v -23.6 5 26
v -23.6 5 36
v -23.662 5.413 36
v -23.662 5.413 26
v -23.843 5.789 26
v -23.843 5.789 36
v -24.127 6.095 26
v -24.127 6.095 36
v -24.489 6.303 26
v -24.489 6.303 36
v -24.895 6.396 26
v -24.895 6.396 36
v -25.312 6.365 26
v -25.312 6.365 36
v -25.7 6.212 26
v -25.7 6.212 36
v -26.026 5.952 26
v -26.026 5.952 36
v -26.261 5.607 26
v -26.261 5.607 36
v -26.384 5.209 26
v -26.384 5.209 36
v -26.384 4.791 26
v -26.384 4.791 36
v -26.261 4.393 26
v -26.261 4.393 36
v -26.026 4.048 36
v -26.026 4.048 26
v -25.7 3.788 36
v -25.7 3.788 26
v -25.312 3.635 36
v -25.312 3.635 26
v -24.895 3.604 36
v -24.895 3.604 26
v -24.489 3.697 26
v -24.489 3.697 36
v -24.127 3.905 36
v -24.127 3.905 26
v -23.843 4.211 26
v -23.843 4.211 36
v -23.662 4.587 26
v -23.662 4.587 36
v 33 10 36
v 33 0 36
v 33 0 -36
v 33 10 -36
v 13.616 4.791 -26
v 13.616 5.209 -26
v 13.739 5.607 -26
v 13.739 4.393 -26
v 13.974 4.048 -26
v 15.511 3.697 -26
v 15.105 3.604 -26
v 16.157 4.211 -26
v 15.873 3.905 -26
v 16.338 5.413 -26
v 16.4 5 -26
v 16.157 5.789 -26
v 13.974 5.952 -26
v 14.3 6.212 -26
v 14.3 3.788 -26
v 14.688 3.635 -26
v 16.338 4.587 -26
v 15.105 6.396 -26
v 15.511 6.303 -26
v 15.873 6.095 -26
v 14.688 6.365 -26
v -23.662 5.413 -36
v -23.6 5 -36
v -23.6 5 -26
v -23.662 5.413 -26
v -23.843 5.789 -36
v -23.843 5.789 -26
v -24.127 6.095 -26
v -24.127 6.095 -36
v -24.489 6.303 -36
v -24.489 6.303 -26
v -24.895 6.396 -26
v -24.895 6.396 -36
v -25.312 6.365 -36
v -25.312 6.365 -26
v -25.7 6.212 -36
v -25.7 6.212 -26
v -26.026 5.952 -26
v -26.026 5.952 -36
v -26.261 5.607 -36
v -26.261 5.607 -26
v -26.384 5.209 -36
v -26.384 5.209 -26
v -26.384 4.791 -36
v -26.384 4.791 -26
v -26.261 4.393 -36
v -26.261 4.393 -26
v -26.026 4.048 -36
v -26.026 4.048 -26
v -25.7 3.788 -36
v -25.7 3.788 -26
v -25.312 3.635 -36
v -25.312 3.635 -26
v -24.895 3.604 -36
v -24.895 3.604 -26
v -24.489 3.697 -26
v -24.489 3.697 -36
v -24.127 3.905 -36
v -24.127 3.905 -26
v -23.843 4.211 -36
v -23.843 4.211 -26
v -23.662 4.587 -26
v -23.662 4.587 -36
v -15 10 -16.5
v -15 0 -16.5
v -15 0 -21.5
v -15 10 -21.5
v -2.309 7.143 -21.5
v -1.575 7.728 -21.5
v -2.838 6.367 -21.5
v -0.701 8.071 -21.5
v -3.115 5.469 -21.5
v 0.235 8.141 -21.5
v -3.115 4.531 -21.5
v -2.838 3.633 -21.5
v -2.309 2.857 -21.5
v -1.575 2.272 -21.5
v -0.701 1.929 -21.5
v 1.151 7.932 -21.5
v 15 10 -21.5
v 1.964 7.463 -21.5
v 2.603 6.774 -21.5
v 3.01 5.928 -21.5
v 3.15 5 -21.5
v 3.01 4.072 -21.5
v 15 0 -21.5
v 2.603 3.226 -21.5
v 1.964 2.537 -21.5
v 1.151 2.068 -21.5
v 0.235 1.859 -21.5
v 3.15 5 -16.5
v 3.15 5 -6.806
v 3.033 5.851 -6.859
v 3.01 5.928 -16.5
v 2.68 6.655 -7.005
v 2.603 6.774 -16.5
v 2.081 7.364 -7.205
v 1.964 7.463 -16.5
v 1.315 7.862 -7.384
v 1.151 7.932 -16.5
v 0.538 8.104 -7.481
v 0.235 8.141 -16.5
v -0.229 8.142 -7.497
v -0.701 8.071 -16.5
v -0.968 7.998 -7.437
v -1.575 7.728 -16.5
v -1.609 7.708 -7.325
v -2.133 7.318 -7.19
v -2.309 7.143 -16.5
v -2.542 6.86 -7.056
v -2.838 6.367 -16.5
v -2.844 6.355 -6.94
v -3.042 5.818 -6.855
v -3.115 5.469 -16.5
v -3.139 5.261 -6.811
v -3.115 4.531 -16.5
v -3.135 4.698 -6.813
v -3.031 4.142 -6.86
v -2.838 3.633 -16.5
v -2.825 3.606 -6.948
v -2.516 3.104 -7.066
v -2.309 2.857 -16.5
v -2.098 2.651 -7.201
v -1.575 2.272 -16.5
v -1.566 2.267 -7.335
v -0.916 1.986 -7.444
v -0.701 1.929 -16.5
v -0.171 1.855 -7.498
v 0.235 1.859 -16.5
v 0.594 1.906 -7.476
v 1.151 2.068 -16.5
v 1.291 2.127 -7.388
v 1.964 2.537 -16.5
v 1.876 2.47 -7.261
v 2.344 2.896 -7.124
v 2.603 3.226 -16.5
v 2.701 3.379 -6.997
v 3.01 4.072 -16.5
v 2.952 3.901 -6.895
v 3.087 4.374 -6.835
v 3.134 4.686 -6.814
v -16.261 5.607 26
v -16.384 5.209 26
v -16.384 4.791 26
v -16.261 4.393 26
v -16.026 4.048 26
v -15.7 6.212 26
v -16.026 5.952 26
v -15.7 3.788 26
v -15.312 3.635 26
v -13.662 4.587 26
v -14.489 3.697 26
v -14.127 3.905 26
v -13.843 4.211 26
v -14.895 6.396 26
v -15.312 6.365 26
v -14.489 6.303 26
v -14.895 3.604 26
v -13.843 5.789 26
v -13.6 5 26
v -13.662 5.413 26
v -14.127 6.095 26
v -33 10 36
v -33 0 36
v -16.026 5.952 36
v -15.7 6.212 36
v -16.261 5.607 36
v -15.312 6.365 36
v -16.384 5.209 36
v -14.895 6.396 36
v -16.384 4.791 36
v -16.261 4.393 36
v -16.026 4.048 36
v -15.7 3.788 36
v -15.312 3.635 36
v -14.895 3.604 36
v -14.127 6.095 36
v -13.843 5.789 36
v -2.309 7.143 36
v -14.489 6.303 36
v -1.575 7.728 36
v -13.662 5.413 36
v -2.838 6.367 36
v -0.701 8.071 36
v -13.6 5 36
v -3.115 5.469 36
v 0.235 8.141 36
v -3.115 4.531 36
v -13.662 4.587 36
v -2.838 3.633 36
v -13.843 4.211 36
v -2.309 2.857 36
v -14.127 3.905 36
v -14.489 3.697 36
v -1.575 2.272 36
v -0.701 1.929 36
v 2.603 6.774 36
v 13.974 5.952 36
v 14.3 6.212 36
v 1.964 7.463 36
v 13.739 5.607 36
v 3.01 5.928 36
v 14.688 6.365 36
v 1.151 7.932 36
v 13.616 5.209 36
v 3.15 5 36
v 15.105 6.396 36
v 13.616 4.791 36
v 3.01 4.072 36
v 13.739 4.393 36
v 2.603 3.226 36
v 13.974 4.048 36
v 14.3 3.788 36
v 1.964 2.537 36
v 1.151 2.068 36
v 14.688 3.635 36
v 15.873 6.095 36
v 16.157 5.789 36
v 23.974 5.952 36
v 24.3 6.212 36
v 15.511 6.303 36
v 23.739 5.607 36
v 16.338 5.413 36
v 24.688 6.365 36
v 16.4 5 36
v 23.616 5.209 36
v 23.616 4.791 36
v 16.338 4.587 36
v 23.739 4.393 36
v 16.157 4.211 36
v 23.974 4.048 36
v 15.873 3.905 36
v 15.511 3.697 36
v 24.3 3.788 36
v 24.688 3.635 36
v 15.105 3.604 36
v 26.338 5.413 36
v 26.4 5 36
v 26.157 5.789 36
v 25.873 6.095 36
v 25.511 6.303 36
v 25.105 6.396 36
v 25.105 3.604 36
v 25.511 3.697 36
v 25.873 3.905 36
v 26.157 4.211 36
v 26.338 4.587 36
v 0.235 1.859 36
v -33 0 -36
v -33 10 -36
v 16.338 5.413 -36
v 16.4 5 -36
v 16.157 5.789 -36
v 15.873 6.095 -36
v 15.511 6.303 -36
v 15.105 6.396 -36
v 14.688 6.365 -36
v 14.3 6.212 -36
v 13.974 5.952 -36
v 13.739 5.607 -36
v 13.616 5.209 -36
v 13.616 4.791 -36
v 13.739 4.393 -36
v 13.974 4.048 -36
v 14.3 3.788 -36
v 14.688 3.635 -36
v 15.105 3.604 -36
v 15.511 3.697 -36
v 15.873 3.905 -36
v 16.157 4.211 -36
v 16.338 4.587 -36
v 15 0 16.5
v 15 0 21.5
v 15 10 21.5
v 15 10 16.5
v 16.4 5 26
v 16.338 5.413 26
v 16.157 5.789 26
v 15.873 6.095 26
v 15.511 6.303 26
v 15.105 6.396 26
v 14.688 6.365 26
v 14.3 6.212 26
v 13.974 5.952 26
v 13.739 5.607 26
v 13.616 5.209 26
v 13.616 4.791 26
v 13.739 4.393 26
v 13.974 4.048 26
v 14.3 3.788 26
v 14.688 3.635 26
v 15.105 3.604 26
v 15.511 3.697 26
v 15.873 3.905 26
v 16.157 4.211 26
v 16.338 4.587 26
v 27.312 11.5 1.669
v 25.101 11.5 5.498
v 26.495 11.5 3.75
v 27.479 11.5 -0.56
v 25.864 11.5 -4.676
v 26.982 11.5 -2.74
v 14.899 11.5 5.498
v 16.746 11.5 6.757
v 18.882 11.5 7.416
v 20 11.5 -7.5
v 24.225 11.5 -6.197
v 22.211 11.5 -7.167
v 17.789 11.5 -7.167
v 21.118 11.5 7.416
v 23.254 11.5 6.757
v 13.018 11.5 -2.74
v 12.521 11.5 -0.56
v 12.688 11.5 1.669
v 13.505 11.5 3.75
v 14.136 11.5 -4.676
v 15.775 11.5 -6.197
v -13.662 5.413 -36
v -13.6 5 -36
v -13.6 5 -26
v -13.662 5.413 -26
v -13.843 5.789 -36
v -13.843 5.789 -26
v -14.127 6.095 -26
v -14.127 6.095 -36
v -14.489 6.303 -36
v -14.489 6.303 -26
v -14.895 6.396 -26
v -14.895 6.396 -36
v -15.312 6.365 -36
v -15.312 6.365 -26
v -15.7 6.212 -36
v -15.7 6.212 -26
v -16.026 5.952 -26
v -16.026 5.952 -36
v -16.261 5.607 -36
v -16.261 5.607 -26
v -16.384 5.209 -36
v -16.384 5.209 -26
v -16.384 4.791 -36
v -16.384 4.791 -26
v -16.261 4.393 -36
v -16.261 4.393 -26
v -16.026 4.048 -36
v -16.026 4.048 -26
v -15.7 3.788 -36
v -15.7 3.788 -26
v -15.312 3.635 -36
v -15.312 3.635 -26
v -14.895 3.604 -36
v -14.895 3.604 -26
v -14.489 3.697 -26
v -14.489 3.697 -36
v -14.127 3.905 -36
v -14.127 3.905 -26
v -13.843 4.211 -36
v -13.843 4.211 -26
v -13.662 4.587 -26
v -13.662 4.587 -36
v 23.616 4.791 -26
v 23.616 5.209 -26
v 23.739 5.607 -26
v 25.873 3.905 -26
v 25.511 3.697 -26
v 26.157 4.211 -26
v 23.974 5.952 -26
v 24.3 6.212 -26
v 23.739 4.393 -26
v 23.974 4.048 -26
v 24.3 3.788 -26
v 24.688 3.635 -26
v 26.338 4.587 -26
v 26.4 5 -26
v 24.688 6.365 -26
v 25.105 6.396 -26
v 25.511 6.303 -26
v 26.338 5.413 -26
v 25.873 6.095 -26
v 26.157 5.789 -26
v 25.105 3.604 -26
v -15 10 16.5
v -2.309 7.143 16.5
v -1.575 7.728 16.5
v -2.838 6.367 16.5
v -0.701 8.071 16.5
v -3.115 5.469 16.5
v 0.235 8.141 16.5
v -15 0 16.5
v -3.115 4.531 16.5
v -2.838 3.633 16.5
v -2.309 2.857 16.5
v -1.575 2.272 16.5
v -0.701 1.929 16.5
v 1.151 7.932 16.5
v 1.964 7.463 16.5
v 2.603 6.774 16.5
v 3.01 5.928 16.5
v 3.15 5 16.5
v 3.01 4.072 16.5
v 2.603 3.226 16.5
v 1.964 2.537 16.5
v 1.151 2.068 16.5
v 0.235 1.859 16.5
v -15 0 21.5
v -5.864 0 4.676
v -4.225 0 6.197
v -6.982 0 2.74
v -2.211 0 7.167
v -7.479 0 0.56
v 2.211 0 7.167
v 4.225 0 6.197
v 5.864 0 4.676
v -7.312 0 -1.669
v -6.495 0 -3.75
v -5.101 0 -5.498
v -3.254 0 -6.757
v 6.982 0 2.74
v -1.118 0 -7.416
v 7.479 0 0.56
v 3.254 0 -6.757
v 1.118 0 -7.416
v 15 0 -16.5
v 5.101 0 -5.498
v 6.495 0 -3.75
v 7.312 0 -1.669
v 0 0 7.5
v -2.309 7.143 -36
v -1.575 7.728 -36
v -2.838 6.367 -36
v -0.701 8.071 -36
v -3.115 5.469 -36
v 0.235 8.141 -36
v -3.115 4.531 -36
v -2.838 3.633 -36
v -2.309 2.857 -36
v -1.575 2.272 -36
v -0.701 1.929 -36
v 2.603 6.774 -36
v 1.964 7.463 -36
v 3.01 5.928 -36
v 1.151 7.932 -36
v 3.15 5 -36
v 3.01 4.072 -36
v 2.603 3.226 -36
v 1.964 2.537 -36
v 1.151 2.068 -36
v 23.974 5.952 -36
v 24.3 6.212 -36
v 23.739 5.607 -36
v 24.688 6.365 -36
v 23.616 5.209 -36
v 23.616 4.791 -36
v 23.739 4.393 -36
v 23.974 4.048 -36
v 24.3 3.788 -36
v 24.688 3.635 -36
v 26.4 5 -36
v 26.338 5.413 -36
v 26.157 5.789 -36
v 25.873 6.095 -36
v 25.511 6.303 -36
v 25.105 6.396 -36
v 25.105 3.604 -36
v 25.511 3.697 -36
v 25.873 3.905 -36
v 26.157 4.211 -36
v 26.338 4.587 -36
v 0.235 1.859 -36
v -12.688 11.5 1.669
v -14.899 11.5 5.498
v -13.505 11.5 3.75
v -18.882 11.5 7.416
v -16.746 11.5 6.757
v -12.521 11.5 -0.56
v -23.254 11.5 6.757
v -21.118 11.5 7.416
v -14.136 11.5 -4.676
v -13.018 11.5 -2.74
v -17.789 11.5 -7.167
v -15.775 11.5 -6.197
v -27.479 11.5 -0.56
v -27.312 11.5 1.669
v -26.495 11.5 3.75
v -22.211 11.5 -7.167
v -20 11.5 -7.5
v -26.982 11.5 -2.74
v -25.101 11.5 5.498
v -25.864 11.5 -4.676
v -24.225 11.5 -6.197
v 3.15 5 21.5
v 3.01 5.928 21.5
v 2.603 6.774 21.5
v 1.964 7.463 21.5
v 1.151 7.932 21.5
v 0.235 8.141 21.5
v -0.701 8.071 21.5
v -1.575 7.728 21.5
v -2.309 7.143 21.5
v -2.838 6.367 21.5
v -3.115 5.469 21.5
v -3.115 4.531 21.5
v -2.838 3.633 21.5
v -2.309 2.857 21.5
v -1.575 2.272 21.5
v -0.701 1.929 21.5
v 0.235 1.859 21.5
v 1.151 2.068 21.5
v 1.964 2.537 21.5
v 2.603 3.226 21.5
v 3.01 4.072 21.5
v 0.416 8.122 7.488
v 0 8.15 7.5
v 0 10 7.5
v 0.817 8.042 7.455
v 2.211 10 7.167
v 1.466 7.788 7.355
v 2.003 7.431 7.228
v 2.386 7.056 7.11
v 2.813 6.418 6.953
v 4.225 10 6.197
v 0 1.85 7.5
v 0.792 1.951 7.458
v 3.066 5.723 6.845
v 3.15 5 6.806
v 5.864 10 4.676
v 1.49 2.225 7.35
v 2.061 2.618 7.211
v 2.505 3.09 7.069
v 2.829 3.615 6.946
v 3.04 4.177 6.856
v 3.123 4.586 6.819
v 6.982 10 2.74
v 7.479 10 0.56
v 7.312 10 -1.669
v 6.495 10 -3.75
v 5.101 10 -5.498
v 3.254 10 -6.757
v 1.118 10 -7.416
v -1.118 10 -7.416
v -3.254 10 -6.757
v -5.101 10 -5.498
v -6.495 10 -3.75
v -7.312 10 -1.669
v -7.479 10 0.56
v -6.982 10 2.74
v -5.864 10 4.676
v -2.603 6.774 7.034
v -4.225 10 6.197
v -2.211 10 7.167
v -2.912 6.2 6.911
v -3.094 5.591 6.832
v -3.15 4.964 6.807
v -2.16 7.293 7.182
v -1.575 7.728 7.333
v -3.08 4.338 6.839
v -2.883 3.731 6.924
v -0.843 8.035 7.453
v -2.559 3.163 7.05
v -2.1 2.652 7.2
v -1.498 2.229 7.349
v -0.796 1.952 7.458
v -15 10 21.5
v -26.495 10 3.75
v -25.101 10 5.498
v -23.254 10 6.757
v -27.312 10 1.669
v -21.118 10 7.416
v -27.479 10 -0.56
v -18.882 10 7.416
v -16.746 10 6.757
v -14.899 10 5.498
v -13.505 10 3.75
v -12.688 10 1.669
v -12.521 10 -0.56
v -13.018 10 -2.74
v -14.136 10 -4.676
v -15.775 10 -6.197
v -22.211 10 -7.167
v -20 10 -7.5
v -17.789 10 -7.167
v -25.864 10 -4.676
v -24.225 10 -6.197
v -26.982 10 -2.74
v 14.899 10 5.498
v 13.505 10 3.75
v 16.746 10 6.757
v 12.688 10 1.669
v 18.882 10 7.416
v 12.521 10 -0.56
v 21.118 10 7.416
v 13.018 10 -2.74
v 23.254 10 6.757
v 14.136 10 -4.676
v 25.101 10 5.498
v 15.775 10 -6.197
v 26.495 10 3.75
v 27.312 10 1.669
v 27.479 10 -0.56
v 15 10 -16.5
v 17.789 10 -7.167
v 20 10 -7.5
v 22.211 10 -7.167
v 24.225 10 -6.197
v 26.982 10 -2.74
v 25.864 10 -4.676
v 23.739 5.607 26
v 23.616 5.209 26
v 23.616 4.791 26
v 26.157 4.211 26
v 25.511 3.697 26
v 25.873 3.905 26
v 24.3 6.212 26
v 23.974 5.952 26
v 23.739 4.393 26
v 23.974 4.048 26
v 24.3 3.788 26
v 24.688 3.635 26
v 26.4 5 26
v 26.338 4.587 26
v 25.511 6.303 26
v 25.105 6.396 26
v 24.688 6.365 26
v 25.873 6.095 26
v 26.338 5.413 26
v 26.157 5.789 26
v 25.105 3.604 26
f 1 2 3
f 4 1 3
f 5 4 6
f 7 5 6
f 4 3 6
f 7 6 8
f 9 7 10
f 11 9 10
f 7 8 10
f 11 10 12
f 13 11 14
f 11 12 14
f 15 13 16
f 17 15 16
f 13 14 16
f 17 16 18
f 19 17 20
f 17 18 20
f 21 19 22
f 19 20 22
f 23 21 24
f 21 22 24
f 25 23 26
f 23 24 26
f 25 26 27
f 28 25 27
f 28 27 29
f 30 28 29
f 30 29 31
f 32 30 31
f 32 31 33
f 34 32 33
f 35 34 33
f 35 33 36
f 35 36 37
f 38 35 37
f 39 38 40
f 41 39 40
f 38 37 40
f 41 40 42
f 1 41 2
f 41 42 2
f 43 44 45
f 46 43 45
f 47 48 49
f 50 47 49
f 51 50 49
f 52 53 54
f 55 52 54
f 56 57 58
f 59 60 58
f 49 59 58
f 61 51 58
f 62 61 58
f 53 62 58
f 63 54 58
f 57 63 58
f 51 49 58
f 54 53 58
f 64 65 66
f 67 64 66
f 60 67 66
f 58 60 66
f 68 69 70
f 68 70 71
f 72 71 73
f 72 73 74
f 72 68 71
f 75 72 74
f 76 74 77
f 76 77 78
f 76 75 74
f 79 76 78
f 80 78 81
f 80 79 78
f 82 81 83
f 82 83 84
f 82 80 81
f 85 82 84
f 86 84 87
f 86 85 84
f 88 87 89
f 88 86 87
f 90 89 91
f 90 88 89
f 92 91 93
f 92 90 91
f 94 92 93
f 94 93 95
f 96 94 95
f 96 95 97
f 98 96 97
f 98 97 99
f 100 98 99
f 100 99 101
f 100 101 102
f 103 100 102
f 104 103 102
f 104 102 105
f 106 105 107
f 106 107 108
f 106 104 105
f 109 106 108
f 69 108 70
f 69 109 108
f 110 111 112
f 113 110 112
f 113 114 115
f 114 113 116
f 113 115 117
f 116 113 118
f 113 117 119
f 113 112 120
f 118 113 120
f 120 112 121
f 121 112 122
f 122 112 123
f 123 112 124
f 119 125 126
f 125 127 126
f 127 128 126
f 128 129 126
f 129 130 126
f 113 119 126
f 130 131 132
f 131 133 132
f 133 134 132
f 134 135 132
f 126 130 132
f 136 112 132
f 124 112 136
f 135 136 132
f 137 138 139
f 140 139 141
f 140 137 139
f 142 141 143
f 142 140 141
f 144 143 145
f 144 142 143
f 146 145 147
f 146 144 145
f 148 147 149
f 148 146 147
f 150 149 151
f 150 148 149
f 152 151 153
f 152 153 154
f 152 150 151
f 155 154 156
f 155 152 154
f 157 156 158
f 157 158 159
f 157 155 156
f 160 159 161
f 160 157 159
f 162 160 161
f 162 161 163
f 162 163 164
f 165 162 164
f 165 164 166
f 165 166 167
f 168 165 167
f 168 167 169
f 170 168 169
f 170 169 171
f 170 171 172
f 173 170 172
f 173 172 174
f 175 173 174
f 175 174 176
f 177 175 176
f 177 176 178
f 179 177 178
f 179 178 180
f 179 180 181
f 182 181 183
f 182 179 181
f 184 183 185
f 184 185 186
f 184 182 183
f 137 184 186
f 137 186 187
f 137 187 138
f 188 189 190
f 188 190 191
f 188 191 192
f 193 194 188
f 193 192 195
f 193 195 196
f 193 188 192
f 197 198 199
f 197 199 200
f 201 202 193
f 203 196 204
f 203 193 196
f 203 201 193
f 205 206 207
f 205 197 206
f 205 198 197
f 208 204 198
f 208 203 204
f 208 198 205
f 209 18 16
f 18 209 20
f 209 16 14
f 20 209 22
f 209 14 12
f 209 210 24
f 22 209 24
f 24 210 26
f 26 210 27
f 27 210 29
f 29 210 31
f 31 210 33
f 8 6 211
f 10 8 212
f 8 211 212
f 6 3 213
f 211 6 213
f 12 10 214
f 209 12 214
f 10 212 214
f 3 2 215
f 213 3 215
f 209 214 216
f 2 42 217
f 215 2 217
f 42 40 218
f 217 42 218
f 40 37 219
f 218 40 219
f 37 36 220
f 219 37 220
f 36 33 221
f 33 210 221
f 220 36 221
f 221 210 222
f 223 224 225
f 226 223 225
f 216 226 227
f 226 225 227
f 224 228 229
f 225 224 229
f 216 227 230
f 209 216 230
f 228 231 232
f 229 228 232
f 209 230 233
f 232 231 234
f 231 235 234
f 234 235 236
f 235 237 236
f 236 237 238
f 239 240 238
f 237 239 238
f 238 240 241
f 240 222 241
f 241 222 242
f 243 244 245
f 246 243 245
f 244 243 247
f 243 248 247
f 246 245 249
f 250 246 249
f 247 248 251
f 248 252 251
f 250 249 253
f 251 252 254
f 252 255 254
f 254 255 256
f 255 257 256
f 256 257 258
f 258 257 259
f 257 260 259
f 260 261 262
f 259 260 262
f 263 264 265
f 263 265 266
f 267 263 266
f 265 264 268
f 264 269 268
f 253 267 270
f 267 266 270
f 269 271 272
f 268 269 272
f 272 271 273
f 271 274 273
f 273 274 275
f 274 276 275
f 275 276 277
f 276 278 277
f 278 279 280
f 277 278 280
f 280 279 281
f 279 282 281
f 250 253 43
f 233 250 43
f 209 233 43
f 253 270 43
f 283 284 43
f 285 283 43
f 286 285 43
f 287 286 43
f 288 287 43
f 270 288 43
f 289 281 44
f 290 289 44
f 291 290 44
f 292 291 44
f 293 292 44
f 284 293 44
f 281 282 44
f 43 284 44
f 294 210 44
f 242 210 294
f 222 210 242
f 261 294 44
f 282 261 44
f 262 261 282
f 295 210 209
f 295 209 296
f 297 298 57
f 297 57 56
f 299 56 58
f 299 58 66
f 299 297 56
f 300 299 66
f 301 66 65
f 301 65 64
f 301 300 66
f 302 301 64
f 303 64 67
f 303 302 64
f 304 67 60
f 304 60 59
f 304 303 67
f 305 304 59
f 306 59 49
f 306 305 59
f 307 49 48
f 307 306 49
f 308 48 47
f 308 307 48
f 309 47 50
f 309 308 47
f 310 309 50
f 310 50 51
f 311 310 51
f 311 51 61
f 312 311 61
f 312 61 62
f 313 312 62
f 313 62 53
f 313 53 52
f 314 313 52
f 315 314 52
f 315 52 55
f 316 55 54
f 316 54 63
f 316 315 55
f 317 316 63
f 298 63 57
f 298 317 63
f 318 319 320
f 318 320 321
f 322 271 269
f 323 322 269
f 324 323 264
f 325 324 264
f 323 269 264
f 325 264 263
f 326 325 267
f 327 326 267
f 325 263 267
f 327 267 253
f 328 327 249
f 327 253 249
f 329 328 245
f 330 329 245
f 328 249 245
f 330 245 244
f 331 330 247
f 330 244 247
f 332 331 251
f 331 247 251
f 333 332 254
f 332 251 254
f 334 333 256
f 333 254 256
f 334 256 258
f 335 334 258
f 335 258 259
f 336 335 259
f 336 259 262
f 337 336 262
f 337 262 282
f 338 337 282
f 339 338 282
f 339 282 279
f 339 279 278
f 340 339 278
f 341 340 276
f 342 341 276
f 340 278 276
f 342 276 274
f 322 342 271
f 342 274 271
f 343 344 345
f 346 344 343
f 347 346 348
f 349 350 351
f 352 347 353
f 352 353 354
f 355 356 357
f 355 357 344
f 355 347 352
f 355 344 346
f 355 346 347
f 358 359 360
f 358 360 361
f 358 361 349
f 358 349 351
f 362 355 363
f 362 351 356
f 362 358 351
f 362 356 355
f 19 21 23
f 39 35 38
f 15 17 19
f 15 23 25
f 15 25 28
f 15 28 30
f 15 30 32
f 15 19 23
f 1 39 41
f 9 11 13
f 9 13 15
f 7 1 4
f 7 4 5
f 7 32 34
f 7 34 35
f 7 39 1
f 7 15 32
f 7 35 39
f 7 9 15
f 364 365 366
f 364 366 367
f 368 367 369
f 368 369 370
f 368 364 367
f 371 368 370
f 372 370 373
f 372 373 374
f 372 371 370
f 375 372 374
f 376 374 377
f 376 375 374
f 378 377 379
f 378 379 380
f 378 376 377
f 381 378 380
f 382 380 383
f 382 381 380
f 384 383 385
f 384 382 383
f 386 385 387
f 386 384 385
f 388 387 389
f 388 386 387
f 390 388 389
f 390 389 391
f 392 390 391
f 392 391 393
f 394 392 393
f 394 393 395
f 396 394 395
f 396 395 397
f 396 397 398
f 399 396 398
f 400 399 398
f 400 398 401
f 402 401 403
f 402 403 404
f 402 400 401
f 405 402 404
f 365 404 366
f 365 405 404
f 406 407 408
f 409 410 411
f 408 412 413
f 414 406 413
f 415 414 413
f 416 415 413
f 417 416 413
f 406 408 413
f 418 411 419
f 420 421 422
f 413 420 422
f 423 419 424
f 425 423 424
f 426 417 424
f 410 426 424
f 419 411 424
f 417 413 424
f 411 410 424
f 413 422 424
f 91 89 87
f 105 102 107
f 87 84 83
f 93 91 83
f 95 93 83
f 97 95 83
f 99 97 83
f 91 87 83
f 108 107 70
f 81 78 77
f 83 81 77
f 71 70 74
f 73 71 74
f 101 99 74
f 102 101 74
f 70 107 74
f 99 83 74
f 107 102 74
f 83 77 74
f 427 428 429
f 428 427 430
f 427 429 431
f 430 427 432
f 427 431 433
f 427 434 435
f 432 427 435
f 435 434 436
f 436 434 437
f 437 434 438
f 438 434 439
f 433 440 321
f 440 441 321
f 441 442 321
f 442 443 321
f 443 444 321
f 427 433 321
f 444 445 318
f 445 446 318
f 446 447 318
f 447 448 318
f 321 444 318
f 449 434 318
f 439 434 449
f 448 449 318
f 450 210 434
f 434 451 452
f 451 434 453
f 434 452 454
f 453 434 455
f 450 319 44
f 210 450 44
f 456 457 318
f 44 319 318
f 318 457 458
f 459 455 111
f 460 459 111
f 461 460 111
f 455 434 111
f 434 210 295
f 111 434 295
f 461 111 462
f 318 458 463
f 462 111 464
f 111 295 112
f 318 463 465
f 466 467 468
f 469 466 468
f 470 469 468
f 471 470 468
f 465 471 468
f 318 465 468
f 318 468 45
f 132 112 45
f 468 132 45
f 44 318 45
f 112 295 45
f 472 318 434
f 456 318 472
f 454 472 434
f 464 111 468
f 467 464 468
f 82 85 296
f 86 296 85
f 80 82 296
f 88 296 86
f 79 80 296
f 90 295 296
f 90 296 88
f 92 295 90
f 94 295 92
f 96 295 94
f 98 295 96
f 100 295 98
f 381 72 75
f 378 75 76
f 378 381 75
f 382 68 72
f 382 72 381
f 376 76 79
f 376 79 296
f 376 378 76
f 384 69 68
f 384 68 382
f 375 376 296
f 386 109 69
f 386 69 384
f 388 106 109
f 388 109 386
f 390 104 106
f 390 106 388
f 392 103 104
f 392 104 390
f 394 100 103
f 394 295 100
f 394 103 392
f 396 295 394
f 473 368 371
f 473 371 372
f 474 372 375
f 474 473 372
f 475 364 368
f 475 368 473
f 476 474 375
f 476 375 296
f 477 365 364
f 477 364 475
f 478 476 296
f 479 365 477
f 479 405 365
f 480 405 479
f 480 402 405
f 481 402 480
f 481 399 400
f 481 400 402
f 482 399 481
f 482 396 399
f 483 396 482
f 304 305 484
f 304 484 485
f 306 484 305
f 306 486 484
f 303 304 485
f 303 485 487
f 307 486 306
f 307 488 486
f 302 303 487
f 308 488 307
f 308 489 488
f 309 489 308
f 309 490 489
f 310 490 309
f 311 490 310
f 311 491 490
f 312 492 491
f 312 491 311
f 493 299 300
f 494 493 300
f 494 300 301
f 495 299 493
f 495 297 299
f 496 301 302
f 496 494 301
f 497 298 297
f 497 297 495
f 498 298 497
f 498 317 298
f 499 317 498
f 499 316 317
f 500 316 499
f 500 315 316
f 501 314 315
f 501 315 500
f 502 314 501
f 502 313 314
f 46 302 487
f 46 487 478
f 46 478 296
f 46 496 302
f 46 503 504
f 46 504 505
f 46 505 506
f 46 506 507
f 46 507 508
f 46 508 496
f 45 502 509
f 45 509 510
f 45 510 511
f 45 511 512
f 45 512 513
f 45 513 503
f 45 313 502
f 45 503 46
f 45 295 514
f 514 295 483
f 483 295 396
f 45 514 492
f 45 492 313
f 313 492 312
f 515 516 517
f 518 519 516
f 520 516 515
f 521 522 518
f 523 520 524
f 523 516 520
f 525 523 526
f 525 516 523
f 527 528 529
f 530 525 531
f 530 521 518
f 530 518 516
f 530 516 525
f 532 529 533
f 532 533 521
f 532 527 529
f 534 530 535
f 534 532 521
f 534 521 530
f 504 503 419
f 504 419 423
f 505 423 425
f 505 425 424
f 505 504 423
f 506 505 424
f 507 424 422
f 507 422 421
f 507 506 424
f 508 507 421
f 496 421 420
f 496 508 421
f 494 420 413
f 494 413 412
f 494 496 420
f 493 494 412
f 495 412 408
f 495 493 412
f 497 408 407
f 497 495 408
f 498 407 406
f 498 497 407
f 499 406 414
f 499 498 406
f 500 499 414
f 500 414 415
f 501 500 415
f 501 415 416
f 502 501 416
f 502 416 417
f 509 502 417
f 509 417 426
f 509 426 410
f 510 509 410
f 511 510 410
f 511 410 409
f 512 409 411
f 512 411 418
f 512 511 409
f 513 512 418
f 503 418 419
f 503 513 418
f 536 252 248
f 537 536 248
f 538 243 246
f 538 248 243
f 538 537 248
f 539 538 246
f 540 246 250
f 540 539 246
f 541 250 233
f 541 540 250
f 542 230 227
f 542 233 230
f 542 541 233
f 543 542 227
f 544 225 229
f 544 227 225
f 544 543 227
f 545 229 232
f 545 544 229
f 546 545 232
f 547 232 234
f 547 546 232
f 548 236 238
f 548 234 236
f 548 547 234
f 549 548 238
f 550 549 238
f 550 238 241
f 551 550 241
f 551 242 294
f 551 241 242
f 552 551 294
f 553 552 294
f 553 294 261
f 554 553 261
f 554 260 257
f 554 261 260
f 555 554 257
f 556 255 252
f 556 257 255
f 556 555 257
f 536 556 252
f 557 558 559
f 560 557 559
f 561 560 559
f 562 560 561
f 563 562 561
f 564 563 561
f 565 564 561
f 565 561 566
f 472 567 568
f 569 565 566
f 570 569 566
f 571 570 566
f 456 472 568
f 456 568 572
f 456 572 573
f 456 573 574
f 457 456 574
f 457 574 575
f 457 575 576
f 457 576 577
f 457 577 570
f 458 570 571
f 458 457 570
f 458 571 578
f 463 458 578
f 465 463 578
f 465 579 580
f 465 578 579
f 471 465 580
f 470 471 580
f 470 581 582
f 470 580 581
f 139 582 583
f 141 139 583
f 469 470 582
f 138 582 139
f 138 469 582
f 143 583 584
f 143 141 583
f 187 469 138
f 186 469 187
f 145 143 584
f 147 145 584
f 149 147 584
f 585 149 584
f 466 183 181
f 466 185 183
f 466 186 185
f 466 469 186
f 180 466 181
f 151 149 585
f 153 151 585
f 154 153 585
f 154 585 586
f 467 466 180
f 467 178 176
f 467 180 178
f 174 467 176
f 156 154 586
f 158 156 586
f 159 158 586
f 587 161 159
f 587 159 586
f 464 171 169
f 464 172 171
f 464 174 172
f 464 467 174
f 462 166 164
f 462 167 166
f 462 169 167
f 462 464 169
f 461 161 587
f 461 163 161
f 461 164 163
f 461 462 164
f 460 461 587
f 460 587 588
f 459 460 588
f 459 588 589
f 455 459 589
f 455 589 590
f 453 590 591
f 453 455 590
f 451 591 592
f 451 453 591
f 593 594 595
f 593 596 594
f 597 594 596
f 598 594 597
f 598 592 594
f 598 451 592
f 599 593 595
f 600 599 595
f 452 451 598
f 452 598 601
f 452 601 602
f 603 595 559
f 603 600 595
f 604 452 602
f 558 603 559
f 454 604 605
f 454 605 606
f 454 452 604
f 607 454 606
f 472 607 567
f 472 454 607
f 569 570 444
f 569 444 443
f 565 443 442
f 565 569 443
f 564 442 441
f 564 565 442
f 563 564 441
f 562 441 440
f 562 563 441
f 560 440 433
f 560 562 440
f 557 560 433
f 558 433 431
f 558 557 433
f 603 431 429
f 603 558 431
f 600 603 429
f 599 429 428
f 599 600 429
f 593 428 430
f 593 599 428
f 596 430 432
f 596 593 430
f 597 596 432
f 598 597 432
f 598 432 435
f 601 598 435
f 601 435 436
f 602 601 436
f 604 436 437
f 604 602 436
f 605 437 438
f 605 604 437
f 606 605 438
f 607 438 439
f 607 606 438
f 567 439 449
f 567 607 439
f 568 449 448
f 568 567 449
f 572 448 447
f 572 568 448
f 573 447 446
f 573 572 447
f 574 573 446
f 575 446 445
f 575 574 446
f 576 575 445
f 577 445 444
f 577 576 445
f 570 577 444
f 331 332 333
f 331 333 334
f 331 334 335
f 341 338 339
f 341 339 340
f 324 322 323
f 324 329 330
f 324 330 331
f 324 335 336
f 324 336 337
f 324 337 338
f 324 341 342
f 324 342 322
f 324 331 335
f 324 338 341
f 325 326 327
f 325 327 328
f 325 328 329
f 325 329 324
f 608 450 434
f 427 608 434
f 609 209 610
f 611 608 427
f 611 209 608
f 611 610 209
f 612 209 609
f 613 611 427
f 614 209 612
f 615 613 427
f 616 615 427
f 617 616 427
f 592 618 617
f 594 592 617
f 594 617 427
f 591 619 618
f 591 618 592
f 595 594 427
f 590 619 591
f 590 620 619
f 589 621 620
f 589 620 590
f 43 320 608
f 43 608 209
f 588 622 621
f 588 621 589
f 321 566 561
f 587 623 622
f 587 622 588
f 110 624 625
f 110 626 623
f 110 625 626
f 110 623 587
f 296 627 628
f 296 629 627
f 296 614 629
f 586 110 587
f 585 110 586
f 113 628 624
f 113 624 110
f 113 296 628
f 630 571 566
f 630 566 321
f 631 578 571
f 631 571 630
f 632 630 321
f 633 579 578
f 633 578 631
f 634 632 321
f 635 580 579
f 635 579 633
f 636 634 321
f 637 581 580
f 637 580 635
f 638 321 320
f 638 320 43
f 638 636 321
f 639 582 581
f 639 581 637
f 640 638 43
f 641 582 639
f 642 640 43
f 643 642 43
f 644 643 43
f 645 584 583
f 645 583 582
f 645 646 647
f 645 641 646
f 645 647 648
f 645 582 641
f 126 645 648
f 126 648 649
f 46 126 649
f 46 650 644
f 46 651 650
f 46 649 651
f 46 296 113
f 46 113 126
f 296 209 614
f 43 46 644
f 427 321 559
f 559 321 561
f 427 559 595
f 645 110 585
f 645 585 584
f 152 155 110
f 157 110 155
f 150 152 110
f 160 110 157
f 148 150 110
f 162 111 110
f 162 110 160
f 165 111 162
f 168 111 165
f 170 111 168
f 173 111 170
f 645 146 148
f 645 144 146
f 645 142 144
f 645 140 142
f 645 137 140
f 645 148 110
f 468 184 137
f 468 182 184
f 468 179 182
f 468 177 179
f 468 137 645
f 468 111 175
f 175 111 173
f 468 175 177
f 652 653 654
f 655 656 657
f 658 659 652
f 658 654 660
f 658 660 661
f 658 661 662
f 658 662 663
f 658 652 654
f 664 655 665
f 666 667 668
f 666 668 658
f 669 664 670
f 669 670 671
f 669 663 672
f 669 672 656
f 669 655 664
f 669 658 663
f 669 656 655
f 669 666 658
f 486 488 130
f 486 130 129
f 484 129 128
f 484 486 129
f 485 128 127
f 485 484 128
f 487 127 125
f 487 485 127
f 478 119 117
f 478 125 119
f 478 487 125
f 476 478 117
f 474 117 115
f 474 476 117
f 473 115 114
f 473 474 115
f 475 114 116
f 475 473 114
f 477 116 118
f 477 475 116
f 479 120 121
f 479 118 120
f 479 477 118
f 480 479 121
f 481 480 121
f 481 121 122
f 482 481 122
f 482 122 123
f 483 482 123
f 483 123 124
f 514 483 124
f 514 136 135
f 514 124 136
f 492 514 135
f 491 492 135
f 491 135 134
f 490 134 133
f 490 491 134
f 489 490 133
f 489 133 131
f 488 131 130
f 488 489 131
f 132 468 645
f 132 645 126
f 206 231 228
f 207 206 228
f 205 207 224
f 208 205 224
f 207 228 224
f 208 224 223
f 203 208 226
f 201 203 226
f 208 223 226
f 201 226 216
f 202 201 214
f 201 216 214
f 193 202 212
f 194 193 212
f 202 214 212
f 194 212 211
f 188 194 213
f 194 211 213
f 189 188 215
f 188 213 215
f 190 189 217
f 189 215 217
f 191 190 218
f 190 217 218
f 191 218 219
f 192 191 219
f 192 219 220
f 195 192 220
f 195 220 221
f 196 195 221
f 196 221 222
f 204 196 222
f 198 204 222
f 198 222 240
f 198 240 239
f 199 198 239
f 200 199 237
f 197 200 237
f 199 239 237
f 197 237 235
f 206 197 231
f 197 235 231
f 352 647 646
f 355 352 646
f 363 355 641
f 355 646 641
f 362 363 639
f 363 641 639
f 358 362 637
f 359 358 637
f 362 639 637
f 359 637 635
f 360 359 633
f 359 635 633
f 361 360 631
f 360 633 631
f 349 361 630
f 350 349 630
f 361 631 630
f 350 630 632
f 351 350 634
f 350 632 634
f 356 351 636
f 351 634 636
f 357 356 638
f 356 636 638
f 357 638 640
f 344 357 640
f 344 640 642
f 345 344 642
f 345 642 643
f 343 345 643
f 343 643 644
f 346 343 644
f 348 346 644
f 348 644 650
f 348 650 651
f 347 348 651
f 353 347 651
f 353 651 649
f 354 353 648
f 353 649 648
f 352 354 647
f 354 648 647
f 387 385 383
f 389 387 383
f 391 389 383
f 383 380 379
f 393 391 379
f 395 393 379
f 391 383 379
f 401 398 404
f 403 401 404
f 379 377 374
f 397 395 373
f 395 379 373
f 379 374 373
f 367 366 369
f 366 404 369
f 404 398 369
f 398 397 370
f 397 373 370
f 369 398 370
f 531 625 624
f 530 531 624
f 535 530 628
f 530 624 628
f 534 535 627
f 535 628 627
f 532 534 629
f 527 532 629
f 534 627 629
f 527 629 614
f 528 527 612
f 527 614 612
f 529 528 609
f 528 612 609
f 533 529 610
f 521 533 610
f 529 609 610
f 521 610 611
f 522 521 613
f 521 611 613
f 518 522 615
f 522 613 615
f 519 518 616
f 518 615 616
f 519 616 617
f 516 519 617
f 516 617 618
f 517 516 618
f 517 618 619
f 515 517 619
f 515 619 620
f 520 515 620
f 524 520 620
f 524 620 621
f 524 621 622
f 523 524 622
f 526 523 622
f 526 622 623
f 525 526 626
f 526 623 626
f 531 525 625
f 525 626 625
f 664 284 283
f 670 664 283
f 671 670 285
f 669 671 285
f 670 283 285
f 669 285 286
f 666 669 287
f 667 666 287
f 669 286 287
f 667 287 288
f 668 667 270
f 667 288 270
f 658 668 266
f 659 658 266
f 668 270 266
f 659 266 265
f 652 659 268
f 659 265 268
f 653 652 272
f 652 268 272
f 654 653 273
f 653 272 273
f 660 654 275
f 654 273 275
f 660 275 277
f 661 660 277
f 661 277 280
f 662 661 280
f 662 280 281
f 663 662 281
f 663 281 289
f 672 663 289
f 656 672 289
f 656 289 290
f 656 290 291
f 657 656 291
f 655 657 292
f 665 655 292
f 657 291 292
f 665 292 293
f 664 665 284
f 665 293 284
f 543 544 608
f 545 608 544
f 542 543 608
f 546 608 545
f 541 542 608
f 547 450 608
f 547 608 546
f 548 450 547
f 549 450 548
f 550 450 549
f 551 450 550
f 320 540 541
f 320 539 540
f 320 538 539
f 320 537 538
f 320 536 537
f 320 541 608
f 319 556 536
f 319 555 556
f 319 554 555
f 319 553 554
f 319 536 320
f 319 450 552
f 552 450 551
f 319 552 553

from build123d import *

# Parameters (mm, degrees)
SKETCH1_W               = 66
SKETCH1_H               = 72
BOSS_EXTRUDE1_DEPTH     = 10
SKETCH2_R               = 1.4
CUT_EXTRUDE1_DEPTH      = 10
CUT_EXTRUDE2_DEPTH      = 50.849774322
CUT_EXTRUDE2_DEPTH_BACK = 50.849774322
SKETCH3_W               = 30
SKETCH3_H               = 5
CUT_EXTRUDE3_DEPTH      = 80.831071645
CUT_EXTRUDE3_DEPTH_BACK = 80.831071645
SKETCH4_R               = 3.15
SKETCH5_R               = 7.5
BOSS_EXTRUDE2_DEPTH     = 1.5
CUT_EXTRUDE4_DEPTH      = 50.849774322
CUT_EXTRUDE4_DEPTH_BACK = 50.849774322
SKETCH6_R               = 7.5


with BuildPart() as part:
    # Sketch1 → Boss-Extrude1 (new body)
    with BuildSketch(Plane(origin=(0, 0, 0), x_dir=(1, 0, 0), z_dir=(0, 1, 0))):
        Rectangle(SKETCH1_W, SKETCH1_H)
    extrude(amount=BOSS_EXTRUDE1_DEPTH)

    # Sketch2 → Cut-Extrude1 (cut)
    with BuildSketch(Plane.XY.offset(36)):
        with Locations((-15, 5)):
            Circle(SKETCH2_R)
        with Locations((15, 5)):
            Circle(SKETCH2_R)
        with Locations((-25, 5)):
            Circle(SKETCH2_R)
        with Locations((25, 5)):
            Circle(SKETCH2_R)
    cut_extrude1 = extrude(amount=-CUT_EXTRUDE1_DEPTH, mode=Mode.SUBTRACT)

    # Mirror1: Cut-Extrude1 across plane
    add(cut_extrude1.mirror(Plane.XY), mode=Mode.SUBTRACT)

    # Sketch3 → Cut-Extrude2 (cut, two sides: drawn at the far end of the back side and taken through both)
    with BuildSketch(Plane(origin=(0, 10, 0), x_dir=(1, 0, 0), z_dir=(0, 1, 0)).offset(-CUT_EXTRUDE2_DEPTH_BACK)):
        with Locations((0, -19)):
            Rectangle(SKETCH3_W, SKETCH3_H)
        with Locations((0, 19)):
            Rectangle(SKETCH3_W, SKETCH3_H)
    extrude(amount=CUT_EXTRUDE2_DEPTH + CUT_EXTRUDE2_DEPTH_BACK, mode=Mode.SUBTRACT)

    # Sketch4 → Cut-Extrude3 (cut, two sides: drawn at the far end of the back side and taken through both)
    with BuildSketch(Plane.XY.offset(36).offset(-CUT_EXTRUDE3_DEPTH_BACK)):
        with Locations((0, 5)):
            Circle(SKETCH4_R)
    extrude(amount=CUT_EXTRUDE3_DEPTH + CUT_EXTRUDE3_DEPTH_BACK, mode=Mode.SUBTRACT)

    # Sketch5 → Boss-Extrude2 (add)
    with BuildSketch(Plane(origin=(0, 10, 0), x_dir=(1, 0, 0), z_dir=(0, 1, 0))):
        with Locations(Location((-20, 0, 0), (0, 0, 90))):
            Circle(SKETCH5_R)
        with Locations(Location((20, 0, 0), (0, 0, 90))):
            Circle(SKETCH5_R)
    extrude(amount=BOSS_EXTRUDE2_DEPTH)

    # Sketch6 → Cut-Extrude4 (cut, two sides: drawn at the far end of the back side and taken through both)
    with BuildSketch(Plane(origin=(0, 10, 0), x_dir=(1, 0, 0), z_dir=(0, 1, 0)).offset(-CUT_EXTRUDE4_DEPTH_BACK)):
        with Locations(Location((0, 0, 0), (0, 0, 270))):
            Circle(SKETCH6_R)
    extrude(amount=CUT_EXTRUDE4_DEPTH + CUT_EXTRUDE4_DEPTH_BACK, mode=Mode.SUBTRACT)


solid = part.part
